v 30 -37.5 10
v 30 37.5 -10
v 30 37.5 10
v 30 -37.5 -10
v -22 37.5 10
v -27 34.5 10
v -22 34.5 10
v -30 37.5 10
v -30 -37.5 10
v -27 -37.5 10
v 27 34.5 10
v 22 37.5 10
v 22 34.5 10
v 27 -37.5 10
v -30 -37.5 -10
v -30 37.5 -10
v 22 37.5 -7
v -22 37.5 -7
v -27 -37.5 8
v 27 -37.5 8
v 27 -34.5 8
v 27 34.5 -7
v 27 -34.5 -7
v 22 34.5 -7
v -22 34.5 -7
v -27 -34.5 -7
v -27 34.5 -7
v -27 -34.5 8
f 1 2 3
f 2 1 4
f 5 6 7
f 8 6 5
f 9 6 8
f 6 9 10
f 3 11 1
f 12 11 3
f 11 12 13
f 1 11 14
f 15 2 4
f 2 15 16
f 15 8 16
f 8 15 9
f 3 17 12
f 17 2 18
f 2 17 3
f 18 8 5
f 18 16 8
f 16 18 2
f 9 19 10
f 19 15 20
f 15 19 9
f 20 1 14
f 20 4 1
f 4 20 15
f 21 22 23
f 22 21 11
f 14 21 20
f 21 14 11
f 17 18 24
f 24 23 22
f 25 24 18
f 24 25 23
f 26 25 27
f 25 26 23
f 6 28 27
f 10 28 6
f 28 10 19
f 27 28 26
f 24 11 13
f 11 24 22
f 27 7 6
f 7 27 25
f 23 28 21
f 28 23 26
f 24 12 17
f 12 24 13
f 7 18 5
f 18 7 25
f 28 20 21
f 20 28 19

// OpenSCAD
wall_thickness		= 3;
thickness				= 17;
difference(){
	cube([54+(wall_thickness*2), 69+(wall_thickness*2), thickness+wall_thickness], center=true);
	translate([0,0,wall_thickness]) cube([54, 69, thickness+wall_thickness], center=true);
	translate([0,wall_thickness+1,wall_thickness]) cube([44, 69, thickness+wall_thickness], center=true);
	#translate([0,-wall_thickness*2,thickness+wall_thickness-2]) cube([54, 69, thickness+wall_thickness], center=true);
}
